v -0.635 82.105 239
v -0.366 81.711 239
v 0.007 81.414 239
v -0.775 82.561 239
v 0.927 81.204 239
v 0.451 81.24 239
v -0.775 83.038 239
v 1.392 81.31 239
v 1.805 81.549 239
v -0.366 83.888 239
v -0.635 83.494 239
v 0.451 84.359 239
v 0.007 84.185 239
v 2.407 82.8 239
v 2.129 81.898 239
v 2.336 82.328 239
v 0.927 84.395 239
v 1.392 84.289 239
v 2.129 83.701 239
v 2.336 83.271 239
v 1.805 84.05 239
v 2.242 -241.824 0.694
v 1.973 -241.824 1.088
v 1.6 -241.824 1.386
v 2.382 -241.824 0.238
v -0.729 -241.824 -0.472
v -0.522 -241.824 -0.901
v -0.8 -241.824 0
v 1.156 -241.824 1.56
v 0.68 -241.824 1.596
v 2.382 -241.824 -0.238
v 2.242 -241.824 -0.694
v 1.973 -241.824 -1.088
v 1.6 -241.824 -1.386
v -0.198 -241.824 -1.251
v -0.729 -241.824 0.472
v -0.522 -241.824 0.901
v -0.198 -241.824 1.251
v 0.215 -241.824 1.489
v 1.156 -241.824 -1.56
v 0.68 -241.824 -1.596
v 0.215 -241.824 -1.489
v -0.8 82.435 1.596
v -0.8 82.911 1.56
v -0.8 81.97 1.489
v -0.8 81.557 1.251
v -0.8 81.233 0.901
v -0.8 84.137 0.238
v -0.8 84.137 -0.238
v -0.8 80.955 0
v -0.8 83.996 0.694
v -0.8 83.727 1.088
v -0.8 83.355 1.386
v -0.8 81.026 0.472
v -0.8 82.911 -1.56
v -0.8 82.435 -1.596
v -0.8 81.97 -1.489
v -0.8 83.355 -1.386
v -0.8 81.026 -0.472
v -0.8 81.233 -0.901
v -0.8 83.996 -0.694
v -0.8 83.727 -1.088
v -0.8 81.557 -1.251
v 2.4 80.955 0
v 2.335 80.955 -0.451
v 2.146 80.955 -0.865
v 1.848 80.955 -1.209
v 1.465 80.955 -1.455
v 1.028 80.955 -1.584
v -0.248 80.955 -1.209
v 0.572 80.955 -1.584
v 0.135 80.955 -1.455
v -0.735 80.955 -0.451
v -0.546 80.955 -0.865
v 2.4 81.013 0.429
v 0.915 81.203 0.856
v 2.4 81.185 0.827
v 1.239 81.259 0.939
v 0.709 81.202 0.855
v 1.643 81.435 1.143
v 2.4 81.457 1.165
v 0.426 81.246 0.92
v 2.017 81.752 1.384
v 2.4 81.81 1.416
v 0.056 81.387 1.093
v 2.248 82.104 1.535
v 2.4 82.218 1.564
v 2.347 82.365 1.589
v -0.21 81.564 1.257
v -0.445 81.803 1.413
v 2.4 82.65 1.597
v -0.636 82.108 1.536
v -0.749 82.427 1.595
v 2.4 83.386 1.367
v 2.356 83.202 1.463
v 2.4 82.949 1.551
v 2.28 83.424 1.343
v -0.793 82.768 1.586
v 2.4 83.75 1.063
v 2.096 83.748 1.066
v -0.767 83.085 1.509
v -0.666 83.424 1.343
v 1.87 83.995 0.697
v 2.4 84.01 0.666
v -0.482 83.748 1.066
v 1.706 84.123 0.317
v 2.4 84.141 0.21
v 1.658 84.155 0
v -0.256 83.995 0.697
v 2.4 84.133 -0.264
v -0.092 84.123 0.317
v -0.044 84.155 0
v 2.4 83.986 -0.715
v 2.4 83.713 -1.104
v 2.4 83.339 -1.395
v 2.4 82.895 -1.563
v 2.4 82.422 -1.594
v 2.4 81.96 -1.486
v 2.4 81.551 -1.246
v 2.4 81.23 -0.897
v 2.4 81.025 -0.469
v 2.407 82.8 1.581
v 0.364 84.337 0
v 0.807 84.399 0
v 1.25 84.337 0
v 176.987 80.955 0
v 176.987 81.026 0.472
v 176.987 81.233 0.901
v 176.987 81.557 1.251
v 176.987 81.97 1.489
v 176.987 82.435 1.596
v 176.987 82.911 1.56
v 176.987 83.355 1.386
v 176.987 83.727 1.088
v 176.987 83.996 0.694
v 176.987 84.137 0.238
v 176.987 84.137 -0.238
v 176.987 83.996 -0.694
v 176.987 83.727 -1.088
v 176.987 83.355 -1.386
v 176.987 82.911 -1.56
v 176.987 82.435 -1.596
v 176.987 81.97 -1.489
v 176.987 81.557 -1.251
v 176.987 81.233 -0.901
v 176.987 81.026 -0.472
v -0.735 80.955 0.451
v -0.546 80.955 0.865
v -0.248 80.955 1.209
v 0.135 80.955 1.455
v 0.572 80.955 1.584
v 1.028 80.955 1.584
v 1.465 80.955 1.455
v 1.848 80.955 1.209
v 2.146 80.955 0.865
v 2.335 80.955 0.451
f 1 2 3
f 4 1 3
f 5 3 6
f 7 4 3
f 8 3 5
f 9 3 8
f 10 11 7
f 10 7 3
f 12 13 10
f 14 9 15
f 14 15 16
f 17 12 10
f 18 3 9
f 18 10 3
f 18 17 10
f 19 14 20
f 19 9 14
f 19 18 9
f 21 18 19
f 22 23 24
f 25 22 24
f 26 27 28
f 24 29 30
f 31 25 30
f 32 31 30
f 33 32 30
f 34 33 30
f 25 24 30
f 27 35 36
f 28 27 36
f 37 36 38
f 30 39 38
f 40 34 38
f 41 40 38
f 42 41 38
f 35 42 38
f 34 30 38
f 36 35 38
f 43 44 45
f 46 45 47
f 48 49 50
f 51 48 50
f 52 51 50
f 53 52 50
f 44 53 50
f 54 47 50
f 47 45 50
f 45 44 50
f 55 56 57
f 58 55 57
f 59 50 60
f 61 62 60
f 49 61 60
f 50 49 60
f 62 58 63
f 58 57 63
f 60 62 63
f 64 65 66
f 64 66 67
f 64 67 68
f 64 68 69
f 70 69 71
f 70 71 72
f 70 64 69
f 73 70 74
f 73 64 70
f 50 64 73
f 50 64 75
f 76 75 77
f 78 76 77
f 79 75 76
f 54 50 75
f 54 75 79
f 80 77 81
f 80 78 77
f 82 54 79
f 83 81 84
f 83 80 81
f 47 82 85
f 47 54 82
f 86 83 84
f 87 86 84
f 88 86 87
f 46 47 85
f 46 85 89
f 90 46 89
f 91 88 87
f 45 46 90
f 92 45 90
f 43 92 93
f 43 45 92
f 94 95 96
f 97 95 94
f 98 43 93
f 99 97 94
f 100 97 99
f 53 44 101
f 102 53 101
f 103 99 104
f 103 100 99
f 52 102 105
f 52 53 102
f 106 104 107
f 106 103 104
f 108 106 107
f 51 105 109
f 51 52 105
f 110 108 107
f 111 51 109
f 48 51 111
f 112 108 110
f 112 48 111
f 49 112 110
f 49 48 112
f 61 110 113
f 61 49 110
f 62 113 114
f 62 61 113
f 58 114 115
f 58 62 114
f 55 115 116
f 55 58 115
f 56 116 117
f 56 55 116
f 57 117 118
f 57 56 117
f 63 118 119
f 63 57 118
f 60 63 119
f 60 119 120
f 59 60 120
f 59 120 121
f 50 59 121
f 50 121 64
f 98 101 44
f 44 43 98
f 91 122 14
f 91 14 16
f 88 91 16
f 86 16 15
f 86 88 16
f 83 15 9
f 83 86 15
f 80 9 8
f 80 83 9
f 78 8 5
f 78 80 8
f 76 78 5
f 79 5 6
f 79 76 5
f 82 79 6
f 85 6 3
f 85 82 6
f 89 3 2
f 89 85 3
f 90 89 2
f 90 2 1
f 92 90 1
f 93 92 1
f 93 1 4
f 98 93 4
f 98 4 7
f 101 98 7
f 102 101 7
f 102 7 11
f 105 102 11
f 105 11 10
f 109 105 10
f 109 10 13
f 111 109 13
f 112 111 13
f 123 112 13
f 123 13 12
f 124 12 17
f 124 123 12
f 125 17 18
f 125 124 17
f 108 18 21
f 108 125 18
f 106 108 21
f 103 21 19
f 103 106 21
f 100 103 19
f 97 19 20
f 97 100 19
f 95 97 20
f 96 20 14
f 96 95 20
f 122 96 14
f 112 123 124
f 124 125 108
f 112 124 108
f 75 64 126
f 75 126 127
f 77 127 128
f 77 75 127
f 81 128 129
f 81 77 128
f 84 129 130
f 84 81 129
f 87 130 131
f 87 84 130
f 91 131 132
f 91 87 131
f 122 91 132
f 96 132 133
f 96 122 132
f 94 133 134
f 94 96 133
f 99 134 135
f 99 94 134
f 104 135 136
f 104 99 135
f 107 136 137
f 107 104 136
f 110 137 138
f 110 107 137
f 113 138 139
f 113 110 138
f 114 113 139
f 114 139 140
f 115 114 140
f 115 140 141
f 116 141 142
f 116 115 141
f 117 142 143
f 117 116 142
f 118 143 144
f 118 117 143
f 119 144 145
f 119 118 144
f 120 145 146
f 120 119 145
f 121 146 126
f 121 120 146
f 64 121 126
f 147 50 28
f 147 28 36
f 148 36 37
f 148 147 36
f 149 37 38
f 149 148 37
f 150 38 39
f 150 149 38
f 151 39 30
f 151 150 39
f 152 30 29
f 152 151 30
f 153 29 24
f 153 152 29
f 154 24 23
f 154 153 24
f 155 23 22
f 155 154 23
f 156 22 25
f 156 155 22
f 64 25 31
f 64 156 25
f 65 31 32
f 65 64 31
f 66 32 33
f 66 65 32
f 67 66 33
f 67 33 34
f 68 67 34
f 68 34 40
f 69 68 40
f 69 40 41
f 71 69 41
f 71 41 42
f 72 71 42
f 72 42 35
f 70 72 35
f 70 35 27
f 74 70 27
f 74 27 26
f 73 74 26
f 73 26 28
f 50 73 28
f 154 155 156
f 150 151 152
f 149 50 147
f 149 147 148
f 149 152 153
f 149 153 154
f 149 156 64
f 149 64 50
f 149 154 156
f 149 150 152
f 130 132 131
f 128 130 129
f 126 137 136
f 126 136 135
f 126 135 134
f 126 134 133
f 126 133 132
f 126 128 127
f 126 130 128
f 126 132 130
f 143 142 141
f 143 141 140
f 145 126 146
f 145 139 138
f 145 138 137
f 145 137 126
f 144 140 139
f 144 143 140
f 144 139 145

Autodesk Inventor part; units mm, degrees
ref_plane "YZ Plane" through (0, 0, 0) normal (1, 0, 0) x (0, 1, 0)
ref_plane "XZ Plane" through (0, 0, 0) normal (0, 1, 0) x (-1, 0, 0)
ref_plane "XY Plane" through (0, 0, 0) normal (0, 0, 1) x (1, 0, 0)
ref_plane "РабПлоскость1" through (0, 0, 0) normal (0, 0, 1) x (1, 0, 0)
sketch "Эскиз1" plane through (0, 0, 0) normal (0, 0, 1) x (1, 0, 0)
  line L0 (-0.8, 15.9546) -> (-0.8, 80.9546)
  line L1 (0.8, 15.9546) -> (0.8, 80.9546)
  line L2 (0.8, 80.9546) -> (-0.8, 80.9546)
  line L3 (-0.8, 15.9546) -> (0.8, 15.9546)
  line L4 (0.8, 15.9546) -> (0.8, -241.8245)
  line L5 (0.8, -241.8245) -> (-0.8, -241.8245)
  line L6 (-0.8, -241.8245) -> (-0.8, 15.9546)
  point P0 (0, 0)
revolve "Вращение1" add sketch "Эскиз1" angle 360 about axis through (0.8, 15.9546, 0) along (0, 1, 0)
ref_plane "РабПлоскость2" through (0, 0, 0) normal (0, 0, 1) x (1, 0, 0)
sketch "Эскиз2" plane through (0, 0, 0) normal (0, 0, 1) x (1, 0, 0)
  line L0 (-0.8, 84.1546) -> (176.9869, 84.1546)
  line L1 (176.9869, 84.1546) -> (176.9869, 80.9546)
  line L2 (176.9869, 80.9546) -> (-0.8, 80.9546)
  line L3 (-0.8, 80.9546) -> (-0.8, 84.1546)
  line L4 (2.4, -241.8245) -> (-0.8, -241.8245) projected
  line L5 (2.4, 80.9546) -> (-0.8, 80.9546) projected
  line L6 (-0.8, 82.5546) -> (176.9869, 82.5546)
  point P0 (0, 0)
  dimension "d1" = 3.2
revolve "Вращение2" add sketch "Эскиз2" angle 360 about axis through (-0.8, 82.5546, 0) along (1, 0, 0) contours L6 L1 L2 L3
ref_plane "РабПлоскость3" through (0, 0, 0) normal (0, 0, 1) x (1, 0, 0)
sketch "Эскиз3" plane through (0, 0, 0) normal (0, 0, 1) x (1, 0, 0)
  circle A0 centre (0.807, 82.7995) radius 1.6
  point P0 (0, 0)
  dimension "d3" = 3.2
extrude "Выдавливание1" add sketch "Эскиз3" along normal blind 239
properties part number "соси"
